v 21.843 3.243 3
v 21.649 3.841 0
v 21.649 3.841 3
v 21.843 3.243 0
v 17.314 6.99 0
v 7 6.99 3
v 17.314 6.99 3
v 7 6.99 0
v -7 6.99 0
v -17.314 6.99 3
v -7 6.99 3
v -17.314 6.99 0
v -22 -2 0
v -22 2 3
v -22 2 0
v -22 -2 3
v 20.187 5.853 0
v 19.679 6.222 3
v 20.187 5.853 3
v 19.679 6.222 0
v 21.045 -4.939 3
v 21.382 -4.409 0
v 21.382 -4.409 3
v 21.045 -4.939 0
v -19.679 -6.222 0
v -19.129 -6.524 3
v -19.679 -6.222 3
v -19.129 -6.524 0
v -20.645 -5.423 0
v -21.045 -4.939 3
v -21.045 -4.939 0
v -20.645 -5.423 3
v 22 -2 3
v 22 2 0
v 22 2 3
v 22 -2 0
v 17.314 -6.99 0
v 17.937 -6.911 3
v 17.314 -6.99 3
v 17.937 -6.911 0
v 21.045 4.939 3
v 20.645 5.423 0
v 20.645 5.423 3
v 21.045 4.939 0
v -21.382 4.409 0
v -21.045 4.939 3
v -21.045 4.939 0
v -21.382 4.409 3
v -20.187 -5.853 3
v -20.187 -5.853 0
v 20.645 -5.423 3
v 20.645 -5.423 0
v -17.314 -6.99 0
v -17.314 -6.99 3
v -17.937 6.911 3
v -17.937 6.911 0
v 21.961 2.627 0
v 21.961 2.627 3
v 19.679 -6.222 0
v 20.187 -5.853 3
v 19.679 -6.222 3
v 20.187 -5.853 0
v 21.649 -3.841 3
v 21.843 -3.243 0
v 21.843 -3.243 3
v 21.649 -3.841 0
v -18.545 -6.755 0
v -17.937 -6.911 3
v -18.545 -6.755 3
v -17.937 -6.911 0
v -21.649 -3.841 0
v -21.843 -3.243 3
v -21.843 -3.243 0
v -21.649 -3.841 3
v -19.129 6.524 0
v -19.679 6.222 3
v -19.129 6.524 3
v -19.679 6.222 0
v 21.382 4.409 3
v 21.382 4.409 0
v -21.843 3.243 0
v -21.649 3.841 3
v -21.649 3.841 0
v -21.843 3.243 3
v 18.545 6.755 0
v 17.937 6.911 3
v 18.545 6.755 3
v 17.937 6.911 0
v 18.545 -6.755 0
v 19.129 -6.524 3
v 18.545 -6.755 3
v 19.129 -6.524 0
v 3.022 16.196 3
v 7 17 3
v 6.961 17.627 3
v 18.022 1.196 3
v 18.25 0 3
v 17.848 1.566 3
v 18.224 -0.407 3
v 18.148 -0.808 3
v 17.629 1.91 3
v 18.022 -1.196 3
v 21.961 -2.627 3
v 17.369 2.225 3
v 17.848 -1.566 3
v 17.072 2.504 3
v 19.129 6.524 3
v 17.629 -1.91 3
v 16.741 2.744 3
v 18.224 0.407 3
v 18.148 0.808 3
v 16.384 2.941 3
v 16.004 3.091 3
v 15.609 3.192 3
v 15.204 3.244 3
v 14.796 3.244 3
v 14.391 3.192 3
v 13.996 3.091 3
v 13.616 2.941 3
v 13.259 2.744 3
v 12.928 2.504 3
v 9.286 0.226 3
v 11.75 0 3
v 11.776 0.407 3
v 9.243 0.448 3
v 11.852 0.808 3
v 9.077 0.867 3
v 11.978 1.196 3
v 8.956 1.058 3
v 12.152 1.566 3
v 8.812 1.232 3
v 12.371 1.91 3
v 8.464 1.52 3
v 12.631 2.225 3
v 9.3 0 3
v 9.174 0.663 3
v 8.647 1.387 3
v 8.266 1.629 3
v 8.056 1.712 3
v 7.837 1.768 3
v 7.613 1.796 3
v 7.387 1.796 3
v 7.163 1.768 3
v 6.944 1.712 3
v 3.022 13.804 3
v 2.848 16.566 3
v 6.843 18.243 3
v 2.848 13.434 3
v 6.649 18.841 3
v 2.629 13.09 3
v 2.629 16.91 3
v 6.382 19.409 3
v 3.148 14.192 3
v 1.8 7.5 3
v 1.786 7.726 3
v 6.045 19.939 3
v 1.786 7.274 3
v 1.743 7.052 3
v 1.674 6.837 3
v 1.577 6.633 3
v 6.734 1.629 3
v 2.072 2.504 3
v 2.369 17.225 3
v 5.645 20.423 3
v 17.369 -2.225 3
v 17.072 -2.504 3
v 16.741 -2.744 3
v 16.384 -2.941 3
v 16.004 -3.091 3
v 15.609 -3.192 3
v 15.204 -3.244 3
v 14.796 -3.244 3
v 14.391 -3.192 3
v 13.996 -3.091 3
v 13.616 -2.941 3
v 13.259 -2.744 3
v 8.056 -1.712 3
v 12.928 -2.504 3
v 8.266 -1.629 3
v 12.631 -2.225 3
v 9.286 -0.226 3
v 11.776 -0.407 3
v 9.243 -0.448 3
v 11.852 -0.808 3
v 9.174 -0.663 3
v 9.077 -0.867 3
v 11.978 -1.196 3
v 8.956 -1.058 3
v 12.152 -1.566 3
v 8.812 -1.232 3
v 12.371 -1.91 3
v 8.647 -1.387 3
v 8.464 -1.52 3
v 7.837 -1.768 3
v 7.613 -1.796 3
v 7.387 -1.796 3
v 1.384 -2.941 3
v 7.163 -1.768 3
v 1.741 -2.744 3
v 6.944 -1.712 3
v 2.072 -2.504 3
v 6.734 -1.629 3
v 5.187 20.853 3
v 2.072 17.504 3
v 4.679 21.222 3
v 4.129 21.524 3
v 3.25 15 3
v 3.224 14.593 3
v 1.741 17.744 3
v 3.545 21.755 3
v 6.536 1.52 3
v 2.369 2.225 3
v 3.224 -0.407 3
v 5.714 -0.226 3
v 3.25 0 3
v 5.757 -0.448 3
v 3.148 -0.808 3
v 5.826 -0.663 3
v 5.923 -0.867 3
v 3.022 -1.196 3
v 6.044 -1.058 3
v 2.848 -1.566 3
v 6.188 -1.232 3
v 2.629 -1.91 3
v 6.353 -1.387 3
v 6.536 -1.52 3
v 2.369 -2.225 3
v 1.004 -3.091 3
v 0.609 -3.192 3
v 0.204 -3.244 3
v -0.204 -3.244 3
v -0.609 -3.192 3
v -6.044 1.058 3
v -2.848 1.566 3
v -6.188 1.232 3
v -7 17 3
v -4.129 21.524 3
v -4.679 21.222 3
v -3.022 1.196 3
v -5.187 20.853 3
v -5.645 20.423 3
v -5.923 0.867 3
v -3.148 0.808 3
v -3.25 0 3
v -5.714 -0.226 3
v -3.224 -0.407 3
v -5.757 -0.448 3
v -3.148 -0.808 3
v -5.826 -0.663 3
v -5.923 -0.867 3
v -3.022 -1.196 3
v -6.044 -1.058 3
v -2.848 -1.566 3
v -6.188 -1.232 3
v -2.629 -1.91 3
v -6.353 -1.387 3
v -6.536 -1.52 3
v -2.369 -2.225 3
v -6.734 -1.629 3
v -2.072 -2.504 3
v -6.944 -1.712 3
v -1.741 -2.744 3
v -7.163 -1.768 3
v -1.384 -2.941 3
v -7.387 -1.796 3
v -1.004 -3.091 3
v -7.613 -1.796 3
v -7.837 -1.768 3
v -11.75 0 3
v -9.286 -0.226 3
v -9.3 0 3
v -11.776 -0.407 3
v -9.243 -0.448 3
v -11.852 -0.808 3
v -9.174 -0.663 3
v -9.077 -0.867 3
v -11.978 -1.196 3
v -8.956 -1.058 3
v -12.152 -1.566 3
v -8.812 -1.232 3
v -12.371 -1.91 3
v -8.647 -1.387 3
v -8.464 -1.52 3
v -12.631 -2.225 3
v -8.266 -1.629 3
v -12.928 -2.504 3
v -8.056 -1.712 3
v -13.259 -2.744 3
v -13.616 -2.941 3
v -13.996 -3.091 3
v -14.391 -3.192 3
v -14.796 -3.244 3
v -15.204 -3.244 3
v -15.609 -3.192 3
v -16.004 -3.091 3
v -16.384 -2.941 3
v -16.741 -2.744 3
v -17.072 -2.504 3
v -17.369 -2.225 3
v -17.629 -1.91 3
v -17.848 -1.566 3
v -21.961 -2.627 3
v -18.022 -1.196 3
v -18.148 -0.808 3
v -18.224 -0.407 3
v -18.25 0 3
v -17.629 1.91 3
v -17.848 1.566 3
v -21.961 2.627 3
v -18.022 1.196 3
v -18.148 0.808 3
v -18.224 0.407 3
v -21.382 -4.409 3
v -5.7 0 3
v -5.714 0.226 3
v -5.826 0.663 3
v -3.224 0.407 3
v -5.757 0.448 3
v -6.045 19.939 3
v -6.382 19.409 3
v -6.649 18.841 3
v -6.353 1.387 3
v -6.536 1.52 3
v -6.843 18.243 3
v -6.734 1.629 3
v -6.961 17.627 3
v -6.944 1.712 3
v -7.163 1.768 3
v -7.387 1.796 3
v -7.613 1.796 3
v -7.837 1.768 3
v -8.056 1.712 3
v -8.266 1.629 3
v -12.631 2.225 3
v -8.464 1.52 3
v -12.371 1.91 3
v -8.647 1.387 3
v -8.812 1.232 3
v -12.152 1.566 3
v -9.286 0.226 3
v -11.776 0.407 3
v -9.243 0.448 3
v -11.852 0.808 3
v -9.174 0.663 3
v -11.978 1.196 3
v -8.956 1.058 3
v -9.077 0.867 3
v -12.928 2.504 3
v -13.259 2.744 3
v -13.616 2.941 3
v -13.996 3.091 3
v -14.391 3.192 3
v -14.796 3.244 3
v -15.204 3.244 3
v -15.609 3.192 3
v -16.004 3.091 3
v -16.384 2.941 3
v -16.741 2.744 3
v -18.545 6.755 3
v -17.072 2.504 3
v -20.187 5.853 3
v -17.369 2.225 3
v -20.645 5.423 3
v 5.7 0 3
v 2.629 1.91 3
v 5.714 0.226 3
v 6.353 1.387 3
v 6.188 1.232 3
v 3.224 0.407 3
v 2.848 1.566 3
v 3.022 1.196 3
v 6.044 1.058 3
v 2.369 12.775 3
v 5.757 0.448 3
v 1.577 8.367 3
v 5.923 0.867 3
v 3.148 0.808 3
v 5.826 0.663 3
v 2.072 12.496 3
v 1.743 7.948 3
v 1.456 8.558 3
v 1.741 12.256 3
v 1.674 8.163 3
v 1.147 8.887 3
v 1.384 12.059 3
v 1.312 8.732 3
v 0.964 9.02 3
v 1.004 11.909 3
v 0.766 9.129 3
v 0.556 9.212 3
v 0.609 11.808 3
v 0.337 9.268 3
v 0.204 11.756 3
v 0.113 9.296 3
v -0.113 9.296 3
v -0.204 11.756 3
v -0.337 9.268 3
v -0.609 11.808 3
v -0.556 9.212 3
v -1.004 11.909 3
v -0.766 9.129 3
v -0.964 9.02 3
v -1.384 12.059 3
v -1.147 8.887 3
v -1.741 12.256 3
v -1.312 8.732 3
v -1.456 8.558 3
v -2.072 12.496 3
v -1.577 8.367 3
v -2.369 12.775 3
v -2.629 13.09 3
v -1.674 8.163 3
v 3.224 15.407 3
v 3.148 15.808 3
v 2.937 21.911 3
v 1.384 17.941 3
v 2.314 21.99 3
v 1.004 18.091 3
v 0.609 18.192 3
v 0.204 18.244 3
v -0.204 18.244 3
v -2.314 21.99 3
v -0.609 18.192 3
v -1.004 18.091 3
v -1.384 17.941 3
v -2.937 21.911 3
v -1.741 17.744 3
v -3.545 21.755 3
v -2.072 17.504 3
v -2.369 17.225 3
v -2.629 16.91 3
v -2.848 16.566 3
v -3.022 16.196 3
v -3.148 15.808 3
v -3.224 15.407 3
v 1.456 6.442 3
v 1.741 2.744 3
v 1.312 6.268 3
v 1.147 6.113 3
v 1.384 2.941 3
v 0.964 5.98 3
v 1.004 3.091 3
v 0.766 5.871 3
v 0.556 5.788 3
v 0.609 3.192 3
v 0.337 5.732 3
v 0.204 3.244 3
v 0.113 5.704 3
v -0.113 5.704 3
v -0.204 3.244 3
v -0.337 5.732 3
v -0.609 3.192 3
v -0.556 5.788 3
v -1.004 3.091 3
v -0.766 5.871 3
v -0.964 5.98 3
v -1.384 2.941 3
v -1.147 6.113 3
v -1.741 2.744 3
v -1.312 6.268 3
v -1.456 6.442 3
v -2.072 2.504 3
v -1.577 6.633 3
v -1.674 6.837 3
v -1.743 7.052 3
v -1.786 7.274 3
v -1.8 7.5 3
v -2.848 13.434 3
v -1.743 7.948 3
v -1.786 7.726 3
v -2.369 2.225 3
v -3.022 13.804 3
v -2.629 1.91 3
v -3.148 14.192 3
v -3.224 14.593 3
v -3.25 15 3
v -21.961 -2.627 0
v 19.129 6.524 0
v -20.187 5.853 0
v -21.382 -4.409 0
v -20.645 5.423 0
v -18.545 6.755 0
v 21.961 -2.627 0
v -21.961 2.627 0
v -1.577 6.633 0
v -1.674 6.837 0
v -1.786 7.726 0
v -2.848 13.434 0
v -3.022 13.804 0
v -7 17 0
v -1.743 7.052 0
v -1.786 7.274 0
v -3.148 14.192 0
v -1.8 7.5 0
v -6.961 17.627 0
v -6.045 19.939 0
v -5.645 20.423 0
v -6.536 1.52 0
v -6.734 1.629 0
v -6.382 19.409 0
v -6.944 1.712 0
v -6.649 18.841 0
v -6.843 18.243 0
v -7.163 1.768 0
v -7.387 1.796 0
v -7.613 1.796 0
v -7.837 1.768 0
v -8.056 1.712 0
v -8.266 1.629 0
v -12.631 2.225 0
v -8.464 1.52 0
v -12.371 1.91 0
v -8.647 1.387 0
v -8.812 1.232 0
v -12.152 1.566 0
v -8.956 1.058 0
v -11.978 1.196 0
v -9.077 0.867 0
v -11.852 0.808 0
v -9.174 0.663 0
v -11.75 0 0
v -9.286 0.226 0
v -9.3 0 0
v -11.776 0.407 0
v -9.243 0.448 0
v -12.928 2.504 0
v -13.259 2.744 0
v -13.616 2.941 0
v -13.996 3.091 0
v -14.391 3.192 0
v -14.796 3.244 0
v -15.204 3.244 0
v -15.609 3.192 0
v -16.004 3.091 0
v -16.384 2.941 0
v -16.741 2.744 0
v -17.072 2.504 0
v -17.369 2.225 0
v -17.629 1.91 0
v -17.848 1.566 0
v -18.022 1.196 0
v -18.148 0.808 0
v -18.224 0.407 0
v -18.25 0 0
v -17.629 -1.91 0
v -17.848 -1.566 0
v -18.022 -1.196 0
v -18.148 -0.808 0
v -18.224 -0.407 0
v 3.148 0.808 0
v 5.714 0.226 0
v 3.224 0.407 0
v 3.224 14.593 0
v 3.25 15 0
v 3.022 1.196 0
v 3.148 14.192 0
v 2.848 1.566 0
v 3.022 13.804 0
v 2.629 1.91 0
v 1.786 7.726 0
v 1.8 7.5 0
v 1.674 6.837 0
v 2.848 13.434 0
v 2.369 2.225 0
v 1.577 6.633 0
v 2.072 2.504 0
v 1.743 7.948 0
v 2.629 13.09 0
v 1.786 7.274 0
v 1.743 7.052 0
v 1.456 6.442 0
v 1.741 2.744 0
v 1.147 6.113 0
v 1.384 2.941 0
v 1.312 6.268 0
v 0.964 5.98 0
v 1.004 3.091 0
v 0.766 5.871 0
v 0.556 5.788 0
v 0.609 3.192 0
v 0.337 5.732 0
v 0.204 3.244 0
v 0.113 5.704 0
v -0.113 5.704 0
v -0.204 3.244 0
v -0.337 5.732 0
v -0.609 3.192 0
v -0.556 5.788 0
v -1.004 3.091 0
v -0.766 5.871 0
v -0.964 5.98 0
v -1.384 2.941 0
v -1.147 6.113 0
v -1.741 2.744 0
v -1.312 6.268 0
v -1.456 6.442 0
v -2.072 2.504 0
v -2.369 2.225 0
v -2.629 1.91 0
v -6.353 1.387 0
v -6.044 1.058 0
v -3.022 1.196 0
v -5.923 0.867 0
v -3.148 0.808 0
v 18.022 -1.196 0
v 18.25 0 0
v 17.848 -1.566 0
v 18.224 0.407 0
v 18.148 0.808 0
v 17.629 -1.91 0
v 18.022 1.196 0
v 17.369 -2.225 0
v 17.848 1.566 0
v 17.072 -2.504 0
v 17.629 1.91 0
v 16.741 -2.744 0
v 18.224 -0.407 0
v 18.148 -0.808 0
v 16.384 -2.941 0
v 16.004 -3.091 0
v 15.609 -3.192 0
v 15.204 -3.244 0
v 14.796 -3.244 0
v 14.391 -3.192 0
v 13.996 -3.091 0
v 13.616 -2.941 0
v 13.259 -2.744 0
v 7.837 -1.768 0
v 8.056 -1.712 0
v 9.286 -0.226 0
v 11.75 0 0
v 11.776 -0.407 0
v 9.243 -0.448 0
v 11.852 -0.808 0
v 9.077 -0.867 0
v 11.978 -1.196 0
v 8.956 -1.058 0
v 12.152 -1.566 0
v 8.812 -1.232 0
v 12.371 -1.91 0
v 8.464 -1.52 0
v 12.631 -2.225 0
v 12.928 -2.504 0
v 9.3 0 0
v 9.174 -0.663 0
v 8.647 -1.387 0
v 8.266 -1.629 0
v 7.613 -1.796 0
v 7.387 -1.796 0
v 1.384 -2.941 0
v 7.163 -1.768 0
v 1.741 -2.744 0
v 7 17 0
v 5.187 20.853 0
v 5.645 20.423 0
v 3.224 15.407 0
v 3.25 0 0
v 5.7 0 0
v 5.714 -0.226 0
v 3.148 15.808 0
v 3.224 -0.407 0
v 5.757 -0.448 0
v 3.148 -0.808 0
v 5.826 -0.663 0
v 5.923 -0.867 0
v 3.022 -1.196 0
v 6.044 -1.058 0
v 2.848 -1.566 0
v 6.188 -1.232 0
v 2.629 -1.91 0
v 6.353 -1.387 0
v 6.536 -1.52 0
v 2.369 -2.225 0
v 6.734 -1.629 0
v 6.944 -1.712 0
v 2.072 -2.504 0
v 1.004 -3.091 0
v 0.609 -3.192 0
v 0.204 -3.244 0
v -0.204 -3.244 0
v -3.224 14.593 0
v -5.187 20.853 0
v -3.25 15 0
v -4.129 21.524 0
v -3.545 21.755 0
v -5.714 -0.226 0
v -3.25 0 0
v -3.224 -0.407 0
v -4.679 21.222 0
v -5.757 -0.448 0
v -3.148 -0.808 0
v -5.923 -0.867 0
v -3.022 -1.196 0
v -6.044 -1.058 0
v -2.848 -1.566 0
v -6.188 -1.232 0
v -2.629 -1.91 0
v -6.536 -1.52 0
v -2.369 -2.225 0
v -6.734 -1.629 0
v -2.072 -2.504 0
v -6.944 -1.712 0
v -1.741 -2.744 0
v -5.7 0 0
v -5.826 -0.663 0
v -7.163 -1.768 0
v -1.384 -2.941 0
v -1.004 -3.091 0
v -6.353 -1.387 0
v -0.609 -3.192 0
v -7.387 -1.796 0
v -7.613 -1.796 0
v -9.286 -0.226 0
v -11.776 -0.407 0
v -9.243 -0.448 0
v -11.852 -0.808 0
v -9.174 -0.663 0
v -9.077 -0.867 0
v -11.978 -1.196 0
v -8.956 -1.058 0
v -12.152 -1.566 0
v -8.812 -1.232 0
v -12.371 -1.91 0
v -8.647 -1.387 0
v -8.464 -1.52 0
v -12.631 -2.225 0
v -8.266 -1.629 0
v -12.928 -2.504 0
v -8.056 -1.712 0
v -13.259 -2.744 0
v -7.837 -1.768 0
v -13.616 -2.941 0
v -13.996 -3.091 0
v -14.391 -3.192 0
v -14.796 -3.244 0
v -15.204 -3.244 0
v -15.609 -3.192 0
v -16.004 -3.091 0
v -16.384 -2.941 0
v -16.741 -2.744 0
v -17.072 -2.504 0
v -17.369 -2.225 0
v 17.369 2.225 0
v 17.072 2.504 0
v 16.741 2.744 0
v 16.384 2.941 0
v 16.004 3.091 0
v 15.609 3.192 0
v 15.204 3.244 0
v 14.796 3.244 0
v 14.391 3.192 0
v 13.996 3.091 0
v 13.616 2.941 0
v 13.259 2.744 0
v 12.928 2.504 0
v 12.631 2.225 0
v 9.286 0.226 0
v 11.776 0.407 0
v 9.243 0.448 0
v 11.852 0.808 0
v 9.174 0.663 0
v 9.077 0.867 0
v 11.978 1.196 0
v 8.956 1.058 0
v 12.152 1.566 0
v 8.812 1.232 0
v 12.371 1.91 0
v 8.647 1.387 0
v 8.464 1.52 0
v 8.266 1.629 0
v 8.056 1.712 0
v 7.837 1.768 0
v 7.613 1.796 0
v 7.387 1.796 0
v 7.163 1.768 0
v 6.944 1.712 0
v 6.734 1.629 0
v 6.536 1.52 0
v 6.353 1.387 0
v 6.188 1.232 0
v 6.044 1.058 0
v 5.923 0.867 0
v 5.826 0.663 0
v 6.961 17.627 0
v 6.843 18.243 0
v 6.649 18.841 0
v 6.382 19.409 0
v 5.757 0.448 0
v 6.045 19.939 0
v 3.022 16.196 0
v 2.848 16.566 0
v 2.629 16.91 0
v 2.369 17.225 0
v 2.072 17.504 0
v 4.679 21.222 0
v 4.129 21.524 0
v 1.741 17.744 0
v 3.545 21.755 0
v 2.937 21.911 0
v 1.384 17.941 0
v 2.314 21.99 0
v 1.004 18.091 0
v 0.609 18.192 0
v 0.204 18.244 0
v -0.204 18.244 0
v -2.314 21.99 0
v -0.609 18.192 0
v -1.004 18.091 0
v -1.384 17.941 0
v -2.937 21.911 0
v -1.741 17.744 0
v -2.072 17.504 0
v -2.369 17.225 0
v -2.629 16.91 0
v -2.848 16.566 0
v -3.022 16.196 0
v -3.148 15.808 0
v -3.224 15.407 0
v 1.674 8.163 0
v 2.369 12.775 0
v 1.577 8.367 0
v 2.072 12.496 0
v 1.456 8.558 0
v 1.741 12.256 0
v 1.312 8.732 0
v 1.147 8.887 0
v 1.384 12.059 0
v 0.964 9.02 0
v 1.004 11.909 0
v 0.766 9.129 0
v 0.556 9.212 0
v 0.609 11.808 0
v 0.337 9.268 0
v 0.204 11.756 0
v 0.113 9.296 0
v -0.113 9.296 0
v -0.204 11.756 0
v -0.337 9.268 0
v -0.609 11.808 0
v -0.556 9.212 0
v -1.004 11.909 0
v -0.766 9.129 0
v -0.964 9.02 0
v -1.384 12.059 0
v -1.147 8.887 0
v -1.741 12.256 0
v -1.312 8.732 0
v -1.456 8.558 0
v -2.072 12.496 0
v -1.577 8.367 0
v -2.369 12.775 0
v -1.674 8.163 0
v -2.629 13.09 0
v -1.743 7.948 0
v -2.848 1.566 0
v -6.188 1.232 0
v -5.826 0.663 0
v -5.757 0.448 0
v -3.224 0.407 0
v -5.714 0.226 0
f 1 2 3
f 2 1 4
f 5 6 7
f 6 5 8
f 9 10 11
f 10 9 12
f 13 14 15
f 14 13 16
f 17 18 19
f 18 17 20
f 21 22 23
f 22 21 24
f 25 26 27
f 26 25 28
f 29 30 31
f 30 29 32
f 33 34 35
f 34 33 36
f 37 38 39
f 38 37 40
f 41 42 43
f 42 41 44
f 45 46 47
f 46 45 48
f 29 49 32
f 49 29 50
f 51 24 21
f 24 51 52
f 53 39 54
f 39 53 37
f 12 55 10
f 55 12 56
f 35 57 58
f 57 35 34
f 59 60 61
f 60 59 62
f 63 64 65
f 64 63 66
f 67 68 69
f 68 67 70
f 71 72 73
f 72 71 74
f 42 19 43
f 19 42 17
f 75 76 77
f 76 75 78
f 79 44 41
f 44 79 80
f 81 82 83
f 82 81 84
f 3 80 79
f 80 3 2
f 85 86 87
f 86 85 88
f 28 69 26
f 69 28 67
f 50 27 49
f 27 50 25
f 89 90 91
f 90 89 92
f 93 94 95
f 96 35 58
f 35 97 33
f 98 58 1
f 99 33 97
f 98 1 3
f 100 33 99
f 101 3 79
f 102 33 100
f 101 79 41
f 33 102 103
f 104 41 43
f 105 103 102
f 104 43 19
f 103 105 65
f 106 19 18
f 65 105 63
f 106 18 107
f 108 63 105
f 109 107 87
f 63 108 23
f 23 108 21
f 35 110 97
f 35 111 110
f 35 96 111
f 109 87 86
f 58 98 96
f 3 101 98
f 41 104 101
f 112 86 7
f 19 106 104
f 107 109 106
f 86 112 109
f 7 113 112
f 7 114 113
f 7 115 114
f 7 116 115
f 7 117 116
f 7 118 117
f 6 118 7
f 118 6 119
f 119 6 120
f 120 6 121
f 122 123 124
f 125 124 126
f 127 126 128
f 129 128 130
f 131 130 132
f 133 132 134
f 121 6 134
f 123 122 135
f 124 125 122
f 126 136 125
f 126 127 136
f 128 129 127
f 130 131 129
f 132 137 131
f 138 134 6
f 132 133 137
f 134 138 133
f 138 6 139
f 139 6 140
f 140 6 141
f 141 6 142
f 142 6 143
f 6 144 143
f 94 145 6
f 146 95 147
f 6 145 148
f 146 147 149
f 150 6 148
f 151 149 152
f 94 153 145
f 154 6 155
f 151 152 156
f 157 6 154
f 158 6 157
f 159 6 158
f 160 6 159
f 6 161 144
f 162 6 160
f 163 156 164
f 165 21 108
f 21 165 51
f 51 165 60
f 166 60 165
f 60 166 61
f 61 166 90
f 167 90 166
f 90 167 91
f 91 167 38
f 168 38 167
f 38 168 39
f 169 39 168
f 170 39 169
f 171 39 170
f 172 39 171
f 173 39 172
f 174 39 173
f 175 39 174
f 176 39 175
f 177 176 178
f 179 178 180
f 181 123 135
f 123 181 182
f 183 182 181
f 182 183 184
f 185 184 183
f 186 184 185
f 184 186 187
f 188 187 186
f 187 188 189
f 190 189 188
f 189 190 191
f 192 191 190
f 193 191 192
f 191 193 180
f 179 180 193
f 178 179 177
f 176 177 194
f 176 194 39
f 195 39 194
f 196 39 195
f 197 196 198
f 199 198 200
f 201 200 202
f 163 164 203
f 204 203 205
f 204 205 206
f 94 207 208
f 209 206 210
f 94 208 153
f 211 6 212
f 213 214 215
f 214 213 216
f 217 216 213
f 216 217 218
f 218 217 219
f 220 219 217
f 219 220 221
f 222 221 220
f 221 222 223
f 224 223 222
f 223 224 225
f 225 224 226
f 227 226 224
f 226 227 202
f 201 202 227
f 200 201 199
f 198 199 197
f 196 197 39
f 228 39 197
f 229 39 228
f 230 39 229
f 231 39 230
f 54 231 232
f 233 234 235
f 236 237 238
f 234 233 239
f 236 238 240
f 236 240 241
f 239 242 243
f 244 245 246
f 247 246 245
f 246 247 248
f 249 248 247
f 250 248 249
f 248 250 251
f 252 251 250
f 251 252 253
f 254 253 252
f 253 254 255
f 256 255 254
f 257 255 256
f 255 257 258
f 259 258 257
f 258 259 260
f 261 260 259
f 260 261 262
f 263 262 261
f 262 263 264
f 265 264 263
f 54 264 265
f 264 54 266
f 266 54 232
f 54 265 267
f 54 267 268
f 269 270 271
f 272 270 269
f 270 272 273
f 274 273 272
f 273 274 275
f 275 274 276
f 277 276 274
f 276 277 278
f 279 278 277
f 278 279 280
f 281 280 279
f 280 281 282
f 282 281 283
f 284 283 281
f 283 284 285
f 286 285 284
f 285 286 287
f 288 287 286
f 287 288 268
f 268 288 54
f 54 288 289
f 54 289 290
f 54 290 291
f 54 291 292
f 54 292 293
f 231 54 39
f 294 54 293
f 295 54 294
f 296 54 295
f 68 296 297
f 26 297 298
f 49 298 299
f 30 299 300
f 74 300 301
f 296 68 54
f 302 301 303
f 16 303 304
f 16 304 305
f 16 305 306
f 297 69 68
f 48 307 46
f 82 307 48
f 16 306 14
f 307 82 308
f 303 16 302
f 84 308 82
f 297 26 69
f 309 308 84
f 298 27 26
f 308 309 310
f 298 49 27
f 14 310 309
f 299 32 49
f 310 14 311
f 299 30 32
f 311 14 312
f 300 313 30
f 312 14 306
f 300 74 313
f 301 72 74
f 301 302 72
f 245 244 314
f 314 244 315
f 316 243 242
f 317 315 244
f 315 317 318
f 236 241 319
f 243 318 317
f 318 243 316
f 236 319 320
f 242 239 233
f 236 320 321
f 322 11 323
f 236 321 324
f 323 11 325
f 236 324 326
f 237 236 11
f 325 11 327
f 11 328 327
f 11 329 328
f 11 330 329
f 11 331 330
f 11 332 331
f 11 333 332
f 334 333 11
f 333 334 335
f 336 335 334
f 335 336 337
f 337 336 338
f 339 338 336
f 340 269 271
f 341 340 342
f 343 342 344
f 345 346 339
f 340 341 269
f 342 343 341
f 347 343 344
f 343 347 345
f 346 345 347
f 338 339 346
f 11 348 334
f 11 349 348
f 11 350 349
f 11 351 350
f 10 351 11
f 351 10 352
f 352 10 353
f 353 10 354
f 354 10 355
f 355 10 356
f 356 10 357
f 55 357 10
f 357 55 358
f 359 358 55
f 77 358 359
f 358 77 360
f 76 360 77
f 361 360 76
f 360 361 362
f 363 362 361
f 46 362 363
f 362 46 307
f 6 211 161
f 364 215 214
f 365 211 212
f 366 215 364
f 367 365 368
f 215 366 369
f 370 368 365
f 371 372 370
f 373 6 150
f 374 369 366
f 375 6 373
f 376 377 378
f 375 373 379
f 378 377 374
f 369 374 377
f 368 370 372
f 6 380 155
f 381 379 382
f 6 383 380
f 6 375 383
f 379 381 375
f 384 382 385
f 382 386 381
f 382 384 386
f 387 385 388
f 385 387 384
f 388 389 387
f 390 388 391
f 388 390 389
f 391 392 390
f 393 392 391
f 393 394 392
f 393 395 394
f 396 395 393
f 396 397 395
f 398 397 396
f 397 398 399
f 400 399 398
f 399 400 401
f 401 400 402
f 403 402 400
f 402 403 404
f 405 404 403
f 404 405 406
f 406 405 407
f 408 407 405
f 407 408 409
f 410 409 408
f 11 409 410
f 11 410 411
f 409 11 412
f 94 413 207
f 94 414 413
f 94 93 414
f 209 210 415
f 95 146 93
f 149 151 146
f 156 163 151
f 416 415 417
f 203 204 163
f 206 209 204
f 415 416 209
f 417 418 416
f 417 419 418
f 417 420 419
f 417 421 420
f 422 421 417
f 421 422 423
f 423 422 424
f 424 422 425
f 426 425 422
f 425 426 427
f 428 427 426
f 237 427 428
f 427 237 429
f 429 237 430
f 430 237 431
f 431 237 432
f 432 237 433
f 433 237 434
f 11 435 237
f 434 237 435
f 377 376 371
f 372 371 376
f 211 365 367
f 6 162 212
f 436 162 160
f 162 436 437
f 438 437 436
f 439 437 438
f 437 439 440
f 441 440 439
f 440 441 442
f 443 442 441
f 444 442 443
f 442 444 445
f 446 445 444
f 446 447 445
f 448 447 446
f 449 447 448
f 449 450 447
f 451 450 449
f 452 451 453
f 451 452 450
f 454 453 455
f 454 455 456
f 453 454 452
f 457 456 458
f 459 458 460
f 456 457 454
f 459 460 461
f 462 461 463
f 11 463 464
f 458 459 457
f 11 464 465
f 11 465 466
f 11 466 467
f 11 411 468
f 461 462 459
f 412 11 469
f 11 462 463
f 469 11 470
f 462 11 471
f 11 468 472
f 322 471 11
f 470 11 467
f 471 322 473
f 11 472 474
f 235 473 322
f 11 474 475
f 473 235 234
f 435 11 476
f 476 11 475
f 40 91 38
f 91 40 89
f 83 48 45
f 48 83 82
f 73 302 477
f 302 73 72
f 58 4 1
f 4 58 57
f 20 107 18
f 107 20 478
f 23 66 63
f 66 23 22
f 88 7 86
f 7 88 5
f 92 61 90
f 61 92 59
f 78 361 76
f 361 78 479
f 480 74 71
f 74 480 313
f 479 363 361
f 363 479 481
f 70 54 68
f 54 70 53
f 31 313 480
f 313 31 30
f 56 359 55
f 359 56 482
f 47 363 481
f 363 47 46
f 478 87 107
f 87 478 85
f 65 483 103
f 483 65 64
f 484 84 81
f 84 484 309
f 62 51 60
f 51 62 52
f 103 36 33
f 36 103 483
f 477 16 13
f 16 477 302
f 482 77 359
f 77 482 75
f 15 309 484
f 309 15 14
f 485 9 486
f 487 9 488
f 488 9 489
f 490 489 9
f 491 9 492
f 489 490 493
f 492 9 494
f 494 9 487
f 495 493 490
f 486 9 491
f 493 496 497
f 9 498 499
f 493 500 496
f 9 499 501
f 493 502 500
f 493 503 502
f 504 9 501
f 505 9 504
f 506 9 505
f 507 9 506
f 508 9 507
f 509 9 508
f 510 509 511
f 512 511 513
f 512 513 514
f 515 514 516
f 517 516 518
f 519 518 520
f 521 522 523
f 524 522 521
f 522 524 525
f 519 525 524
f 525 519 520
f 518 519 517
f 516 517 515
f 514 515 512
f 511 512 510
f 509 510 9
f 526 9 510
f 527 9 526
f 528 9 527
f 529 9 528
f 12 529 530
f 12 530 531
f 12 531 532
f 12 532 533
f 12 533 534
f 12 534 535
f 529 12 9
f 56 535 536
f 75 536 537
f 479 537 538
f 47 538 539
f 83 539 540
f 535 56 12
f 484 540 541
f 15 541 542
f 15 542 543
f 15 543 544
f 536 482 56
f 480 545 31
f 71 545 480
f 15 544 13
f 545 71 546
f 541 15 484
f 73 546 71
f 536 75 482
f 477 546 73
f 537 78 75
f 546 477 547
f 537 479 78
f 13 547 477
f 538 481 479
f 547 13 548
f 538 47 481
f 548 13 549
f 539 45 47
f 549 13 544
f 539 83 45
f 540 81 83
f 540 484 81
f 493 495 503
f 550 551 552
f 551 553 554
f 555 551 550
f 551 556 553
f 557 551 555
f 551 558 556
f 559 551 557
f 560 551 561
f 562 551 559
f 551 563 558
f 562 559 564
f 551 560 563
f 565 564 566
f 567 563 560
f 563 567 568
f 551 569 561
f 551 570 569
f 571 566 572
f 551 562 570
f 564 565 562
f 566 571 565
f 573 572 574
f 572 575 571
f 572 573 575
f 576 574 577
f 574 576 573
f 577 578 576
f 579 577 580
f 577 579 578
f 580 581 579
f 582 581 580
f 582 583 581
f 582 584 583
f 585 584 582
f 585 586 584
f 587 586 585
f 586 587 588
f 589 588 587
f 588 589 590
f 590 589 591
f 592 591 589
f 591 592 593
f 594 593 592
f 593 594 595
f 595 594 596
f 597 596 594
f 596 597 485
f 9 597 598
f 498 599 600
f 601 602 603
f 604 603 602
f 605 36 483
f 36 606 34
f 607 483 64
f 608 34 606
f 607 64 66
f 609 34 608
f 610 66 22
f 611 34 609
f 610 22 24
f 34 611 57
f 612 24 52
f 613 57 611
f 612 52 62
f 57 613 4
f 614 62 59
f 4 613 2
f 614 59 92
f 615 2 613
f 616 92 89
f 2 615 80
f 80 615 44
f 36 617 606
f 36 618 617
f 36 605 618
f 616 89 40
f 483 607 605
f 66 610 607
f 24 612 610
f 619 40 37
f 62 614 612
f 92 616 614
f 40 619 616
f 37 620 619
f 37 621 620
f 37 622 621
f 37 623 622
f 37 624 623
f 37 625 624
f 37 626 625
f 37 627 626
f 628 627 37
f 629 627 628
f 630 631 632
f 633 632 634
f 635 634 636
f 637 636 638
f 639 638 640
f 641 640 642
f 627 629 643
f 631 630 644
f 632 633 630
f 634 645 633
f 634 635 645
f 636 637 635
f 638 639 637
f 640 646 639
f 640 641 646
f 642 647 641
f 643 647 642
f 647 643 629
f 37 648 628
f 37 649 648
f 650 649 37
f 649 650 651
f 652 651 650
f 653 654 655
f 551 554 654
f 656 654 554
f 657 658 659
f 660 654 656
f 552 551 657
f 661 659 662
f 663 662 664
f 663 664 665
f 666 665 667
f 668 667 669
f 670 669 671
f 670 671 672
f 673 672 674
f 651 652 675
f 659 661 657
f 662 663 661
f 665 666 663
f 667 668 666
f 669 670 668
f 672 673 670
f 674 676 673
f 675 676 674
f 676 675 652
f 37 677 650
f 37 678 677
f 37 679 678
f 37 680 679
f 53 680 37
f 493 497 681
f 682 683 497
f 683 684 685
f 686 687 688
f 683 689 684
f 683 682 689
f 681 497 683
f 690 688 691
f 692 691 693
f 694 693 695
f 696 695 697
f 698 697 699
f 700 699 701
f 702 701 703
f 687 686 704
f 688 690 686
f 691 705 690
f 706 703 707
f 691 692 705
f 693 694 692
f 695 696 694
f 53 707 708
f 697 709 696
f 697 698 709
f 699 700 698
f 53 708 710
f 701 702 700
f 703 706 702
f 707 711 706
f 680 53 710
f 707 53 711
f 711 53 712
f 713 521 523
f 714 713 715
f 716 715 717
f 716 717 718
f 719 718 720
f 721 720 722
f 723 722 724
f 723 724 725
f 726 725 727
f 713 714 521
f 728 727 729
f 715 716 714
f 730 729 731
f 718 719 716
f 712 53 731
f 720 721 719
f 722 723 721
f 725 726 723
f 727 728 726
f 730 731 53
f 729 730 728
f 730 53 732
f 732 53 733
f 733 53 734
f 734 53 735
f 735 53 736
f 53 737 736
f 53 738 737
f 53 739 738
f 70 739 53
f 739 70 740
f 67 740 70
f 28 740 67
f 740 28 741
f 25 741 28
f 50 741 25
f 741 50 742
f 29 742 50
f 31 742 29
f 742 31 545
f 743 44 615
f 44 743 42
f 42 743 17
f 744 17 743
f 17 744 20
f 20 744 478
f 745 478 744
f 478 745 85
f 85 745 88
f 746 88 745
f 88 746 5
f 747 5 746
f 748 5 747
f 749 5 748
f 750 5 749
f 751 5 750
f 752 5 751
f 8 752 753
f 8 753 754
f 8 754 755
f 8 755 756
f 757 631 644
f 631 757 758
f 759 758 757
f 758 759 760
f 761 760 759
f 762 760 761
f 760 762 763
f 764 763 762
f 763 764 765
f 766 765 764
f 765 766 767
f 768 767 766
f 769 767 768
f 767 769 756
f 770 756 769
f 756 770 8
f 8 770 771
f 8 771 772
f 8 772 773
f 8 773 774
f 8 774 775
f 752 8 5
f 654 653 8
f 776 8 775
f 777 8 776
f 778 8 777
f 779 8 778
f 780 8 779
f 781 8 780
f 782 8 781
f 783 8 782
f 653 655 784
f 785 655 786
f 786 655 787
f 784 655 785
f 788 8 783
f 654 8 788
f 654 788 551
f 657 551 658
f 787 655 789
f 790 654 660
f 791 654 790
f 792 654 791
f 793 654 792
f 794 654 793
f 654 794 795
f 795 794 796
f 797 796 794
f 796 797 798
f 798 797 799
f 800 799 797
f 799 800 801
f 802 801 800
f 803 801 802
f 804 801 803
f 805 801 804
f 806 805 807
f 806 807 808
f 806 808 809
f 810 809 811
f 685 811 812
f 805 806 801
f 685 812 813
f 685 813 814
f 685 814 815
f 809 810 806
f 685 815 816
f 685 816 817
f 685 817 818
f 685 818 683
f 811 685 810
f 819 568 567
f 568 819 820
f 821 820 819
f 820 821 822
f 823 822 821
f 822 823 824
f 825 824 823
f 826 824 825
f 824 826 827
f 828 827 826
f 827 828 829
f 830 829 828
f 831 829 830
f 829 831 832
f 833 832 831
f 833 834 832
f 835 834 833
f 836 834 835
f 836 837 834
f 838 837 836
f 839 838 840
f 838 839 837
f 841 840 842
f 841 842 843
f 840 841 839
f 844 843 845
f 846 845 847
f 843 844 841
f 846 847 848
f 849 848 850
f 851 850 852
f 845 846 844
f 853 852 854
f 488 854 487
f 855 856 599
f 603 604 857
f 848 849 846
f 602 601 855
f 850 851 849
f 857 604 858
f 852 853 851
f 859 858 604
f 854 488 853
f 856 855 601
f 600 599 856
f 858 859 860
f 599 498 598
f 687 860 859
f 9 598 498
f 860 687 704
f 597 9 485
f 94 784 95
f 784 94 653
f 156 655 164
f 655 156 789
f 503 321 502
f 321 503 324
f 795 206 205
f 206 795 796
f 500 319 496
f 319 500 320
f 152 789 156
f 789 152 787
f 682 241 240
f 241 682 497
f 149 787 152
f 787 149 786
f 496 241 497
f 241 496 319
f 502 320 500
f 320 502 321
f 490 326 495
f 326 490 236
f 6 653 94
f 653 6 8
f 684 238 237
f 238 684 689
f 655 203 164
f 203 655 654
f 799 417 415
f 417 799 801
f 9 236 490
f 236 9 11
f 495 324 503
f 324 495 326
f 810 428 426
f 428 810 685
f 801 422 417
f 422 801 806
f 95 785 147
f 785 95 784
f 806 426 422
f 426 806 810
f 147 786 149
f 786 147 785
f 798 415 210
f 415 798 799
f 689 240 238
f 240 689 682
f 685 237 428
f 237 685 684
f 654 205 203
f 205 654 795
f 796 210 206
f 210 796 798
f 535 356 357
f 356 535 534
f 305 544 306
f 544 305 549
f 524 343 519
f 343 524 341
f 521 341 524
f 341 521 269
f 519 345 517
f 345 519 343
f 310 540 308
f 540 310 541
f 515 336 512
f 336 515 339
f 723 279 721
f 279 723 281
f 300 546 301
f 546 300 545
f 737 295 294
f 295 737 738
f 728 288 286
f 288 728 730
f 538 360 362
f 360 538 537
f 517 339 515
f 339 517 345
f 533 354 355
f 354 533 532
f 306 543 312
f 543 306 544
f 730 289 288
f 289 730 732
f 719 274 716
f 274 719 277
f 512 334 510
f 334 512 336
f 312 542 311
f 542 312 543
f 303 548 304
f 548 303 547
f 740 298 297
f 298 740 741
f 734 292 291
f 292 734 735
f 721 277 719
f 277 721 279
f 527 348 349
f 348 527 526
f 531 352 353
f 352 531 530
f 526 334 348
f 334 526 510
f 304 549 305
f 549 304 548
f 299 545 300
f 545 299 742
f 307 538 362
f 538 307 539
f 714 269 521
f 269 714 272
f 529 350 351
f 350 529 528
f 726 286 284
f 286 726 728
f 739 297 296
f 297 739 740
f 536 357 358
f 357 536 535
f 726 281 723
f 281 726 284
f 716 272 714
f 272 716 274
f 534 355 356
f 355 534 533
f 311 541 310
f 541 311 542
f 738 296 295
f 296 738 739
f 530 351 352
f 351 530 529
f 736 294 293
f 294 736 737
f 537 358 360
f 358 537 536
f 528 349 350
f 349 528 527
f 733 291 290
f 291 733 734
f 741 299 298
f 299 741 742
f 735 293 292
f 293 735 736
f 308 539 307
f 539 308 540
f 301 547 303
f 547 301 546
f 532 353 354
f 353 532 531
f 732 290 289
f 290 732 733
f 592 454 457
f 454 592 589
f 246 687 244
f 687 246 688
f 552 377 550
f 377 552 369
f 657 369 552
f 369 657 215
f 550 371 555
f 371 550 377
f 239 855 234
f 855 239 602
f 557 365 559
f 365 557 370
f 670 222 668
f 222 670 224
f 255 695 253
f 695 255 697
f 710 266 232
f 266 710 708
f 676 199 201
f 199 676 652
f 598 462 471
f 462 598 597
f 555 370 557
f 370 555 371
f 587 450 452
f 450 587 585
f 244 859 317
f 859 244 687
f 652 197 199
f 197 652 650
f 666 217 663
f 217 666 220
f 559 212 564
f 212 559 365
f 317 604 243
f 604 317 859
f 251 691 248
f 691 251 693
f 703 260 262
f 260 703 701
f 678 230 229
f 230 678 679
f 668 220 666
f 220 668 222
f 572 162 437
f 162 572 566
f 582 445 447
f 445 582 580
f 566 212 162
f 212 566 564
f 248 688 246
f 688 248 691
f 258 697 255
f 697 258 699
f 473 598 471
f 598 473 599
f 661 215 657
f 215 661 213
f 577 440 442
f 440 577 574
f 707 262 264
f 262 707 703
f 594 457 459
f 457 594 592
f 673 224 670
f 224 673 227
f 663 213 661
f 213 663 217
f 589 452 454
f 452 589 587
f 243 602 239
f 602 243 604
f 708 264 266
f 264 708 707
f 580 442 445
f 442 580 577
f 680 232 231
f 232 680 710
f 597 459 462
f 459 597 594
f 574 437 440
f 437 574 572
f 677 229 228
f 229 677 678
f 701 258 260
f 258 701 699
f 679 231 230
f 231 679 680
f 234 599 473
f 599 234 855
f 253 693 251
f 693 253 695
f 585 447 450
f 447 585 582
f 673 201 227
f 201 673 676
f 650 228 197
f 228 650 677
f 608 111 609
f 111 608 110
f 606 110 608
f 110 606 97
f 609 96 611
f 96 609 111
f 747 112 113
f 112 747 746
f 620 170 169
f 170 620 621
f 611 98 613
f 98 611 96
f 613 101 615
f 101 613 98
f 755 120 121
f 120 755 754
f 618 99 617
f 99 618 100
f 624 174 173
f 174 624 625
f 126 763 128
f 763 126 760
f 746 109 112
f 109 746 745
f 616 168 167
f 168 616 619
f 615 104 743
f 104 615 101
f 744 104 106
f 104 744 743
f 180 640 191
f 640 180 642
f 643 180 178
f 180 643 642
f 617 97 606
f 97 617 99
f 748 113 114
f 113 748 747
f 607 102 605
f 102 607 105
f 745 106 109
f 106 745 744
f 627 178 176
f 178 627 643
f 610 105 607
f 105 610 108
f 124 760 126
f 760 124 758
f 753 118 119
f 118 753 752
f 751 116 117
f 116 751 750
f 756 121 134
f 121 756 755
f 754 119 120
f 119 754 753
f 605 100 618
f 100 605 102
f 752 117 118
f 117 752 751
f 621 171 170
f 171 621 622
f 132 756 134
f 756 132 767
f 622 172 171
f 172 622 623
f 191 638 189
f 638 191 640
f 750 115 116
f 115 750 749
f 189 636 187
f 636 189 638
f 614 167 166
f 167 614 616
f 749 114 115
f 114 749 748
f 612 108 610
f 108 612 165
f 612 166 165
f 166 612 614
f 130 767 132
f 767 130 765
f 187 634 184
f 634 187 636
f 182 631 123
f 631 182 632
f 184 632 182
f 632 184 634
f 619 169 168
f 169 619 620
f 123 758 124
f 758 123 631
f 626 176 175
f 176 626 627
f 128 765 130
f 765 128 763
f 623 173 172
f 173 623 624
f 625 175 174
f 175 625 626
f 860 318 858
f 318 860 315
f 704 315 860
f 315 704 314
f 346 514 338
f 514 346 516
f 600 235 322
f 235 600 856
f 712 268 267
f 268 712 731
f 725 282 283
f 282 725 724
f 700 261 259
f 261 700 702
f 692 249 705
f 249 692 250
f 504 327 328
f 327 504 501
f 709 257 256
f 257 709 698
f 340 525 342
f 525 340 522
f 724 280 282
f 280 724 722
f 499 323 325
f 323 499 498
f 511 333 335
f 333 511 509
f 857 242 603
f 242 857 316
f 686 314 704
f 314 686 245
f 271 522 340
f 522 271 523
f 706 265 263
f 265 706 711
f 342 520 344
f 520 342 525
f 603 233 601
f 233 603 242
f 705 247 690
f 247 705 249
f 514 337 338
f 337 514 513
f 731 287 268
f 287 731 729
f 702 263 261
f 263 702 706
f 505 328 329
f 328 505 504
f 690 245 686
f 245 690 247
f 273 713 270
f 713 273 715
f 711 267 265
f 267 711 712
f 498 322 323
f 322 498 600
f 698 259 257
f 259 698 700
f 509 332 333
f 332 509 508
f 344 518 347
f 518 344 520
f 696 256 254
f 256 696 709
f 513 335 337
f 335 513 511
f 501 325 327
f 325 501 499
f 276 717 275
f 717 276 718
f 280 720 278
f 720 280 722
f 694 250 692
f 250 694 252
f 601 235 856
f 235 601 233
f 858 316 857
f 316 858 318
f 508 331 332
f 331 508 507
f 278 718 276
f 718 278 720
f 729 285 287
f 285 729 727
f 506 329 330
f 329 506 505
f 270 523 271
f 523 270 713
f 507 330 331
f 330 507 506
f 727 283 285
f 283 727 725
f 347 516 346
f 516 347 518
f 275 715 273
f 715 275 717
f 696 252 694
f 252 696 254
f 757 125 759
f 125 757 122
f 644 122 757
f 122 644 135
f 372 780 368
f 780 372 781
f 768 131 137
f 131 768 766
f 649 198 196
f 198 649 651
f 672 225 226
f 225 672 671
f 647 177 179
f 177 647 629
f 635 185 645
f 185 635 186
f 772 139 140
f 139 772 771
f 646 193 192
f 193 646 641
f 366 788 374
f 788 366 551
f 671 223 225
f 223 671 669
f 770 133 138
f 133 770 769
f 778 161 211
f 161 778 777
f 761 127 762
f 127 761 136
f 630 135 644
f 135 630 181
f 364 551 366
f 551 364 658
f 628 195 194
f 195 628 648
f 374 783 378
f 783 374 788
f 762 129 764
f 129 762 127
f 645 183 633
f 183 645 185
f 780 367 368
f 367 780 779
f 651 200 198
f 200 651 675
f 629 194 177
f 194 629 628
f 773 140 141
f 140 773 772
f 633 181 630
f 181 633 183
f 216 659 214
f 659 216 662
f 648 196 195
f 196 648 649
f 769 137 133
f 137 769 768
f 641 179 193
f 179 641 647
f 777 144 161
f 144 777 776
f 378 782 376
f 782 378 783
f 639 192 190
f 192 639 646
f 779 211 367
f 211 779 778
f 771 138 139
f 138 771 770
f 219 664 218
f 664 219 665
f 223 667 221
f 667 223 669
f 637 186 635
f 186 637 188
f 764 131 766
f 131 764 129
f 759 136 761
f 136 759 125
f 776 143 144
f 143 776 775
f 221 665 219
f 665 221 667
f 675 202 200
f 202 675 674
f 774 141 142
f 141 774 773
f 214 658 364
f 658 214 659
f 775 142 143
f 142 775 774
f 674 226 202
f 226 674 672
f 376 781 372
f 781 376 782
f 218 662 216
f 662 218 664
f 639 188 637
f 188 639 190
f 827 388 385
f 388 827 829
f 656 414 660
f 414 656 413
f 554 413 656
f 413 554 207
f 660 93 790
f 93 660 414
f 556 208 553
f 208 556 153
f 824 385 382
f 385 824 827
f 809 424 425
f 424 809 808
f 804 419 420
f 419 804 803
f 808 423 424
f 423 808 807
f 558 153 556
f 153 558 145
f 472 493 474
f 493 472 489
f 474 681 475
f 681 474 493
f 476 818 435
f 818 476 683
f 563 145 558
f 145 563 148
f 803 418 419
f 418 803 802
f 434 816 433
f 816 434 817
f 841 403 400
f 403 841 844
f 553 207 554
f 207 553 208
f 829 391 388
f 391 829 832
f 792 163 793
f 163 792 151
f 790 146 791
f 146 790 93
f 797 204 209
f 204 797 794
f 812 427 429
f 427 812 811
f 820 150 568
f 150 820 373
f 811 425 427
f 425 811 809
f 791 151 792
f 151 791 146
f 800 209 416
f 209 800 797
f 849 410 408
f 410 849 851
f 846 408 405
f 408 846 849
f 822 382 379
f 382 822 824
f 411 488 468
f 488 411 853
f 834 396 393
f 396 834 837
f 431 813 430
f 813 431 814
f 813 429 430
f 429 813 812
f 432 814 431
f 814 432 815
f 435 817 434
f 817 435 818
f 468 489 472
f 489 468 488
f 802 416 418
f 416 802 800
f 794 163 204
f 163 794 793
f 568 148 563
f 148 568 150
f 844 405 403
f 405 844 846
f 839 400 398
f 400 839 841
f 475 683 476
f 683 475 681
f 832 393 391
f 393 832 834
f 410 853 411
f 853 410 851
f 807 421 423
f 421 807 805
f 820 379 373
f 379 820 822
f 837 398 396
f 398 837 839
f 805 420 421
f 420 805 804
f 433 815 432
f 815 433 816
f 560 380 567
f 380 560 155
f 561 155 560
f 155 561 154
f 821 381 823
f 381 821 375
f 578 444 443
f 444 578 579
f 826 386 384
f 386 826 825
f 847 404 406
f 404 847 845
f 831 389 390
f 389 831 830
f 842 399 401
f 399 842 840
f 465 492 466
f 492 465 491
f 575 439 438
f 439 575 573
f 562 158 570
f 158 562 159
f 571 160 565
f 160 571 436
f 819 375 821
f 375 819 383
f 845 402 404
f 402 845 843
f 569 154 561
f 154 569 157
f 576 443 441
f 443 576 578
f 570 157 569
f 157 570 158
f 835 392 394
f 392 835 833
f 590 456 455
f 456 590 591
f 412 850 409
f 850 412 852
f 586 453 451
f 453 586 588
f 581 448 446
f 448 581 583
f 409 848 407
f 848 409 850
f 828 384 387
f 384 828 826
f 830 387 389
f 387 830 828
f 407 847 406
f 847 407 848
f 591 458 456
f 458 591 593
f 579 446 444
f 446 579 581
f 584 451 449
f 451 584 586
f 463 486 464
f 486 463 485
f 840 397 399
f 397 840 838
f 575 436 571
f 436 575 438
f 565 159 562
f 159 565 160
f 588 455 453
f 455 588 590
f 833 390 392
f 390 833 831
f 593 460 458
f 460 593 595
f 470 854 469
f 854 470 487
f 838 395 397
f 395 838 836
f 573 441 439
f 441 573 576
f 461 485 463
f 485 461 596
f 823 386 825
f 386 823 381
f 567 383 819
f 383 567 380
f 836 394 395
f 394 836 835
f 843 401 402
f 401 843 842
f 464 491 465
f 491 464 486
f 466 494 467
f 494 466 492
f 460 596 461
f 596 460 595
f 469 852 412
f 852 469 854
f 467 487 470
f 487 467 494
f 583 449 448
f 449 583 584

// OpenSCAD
$fn = 50;


difference() {
	union() {
		*color(alpha = 1.0000000000, c = "gray") {
			translate(v = [0, 7, 0]) {
				linear_extrude(height = 1) {
					text(font = "Arial:style=Bold", halign = "center", size = 4.5000000000, text = "COMMENT plate main", valign = "center");
				}
			}
		}
		hull() {
			translate(v = [-17.0000000000, 2.0000000000, 0]) {
				cylinder(h = 3, r = 5);
			}
			translate(v = [17.0000000000, 2.0000000000, 0]) {
				cylinder(h = 3, r = 5);
			}
			translate(v = [-17.0000000000, -2.0000000000, 0]) {
				cylinder(h = 3, r = 5);
			}
			translate(v = [17.0000000000, -2.0000000000, 0]) {
				cylinder(h = 3, r = 5);
			}
		}
		*color(alpha = 1.0000000000, c = "gray") {
			translate(v = [0, 7, 0]) {
				linear_extrude(height = 1) {
					text(font = "Arial:style=Bold", halign = "center", size = 4.5000000000, text = "COMMENT plate main", valign = "center");
				}
			}
		}
		translate(v = [0, 7.5000000000, 0]) {
			hull() {
				translate(v = [-2.0000000000, 9.5000000000, 0]) {
					cylinder(h = 3, r = 5);
				}
				translate(v = [2.0000000000, 9.5000000000, 0]) {
					cylinder(h = 3, r = 5);
				}
				translate(v = [-2.0000000000, -9.5000000000, 0]) {
					cylinder(h = 3, r = 5);
				}
				translate(v = [2.0000000000, -9.5000000000, 0]) {
					cylinder(h = 3, r = 5);
				}
			}
		}
	}
	union() {
		*color(alpha = 1.0000000000, c = "gray") {
			translate(v = [0, 7, 0]) {
				linear_extrude(height = 1) {
					text(font = "Arial:style=Bold", halign = "center", size = 4.5000000000, text = "COMMENT holes main", valign = "center");
				}
			}
		}
		translate(v = [-15.0000000000, 0.0000000000, 0]) {
			translate(v = [0, 0, -100]) {
				cylinder(h = 200, r = 3.2500000000);
			}
		}
		translate(v = [0, 0, -100]) {
			cylinder(h = 200, r = 3.2500000000);
		}
		translate(v = [15.0000000000, 0.0000000000, 0]) {
			translate(v = [0, 0, -100]) {
				cylinder(h = 200, r = 3.2500000000);
			}
		}
		translate(v = [-15.0000000000, 0.0000000000, 0]) {
			translate(v = [0, 0, -100]) {
				cylinder(h = 200, r = 1.8000000000);
			}
		}
		translate(v = [-7.5000000000, 0.0000000000, 0]) {
			translate(v = [0, 0, -100]) {
				cylinder(h = 200, r = 1.8000000000);
			}
		}
		translate(v = [0, 0, -100]) {
			cylinder(h = 200, r = 1.8000000000);
		}
		translate(v = [7.5000000000, 0.0000000000, 0]) {
			translate(v = [0, 0, -100]) {
				cylinder(h = 200, r = 1.8000000000);
			}
		}
		translate(v = [15.0000000000, 0.0000000000, 0]) {
			translate(v = [0, 0, -100]) {
				cylinder(h = 200, r = 1.8000000000);
			}
		}
		*color(alpha = 1.0000000000, c = "gray") {
			translate(v = [0, 7, 0]) {
				linear_extrude(height = 1) {
					text(font = "Arial:style=Bold", halign = "center", size = 4.5000000000, text = "COMMENT holes main", valign = "center");
				}
			}
		}
		translate(v = [0, 0, -100]) {
			cylinder(h = 200, r = 3.2500000000);
		}
		translate(v = [0.0000000000, 15.0000000000, 0]) {
			translate(v = [0, 0, -100]) {
				cylinder(h = 200, r = 3.2500000000);
			}
		}
		translate(v = [0, 0, -100]) {
			cylinder(h = 200, r = 1.8000000000);
		}
		translate(v = [0.0000000000, 7.5000000000, 0]) {
			translate(v = [0, 0, -100]) {
				cylinder(h = 200, r = 1.8000000000);
			}
		}
		translate(v = [0.0000000000, 15.0000000000, 0]) {
			translate(v = [0, 0, -100]) {
				cylinder(h = 200, r = 1.8000000000);
			}
		}
	}
}
